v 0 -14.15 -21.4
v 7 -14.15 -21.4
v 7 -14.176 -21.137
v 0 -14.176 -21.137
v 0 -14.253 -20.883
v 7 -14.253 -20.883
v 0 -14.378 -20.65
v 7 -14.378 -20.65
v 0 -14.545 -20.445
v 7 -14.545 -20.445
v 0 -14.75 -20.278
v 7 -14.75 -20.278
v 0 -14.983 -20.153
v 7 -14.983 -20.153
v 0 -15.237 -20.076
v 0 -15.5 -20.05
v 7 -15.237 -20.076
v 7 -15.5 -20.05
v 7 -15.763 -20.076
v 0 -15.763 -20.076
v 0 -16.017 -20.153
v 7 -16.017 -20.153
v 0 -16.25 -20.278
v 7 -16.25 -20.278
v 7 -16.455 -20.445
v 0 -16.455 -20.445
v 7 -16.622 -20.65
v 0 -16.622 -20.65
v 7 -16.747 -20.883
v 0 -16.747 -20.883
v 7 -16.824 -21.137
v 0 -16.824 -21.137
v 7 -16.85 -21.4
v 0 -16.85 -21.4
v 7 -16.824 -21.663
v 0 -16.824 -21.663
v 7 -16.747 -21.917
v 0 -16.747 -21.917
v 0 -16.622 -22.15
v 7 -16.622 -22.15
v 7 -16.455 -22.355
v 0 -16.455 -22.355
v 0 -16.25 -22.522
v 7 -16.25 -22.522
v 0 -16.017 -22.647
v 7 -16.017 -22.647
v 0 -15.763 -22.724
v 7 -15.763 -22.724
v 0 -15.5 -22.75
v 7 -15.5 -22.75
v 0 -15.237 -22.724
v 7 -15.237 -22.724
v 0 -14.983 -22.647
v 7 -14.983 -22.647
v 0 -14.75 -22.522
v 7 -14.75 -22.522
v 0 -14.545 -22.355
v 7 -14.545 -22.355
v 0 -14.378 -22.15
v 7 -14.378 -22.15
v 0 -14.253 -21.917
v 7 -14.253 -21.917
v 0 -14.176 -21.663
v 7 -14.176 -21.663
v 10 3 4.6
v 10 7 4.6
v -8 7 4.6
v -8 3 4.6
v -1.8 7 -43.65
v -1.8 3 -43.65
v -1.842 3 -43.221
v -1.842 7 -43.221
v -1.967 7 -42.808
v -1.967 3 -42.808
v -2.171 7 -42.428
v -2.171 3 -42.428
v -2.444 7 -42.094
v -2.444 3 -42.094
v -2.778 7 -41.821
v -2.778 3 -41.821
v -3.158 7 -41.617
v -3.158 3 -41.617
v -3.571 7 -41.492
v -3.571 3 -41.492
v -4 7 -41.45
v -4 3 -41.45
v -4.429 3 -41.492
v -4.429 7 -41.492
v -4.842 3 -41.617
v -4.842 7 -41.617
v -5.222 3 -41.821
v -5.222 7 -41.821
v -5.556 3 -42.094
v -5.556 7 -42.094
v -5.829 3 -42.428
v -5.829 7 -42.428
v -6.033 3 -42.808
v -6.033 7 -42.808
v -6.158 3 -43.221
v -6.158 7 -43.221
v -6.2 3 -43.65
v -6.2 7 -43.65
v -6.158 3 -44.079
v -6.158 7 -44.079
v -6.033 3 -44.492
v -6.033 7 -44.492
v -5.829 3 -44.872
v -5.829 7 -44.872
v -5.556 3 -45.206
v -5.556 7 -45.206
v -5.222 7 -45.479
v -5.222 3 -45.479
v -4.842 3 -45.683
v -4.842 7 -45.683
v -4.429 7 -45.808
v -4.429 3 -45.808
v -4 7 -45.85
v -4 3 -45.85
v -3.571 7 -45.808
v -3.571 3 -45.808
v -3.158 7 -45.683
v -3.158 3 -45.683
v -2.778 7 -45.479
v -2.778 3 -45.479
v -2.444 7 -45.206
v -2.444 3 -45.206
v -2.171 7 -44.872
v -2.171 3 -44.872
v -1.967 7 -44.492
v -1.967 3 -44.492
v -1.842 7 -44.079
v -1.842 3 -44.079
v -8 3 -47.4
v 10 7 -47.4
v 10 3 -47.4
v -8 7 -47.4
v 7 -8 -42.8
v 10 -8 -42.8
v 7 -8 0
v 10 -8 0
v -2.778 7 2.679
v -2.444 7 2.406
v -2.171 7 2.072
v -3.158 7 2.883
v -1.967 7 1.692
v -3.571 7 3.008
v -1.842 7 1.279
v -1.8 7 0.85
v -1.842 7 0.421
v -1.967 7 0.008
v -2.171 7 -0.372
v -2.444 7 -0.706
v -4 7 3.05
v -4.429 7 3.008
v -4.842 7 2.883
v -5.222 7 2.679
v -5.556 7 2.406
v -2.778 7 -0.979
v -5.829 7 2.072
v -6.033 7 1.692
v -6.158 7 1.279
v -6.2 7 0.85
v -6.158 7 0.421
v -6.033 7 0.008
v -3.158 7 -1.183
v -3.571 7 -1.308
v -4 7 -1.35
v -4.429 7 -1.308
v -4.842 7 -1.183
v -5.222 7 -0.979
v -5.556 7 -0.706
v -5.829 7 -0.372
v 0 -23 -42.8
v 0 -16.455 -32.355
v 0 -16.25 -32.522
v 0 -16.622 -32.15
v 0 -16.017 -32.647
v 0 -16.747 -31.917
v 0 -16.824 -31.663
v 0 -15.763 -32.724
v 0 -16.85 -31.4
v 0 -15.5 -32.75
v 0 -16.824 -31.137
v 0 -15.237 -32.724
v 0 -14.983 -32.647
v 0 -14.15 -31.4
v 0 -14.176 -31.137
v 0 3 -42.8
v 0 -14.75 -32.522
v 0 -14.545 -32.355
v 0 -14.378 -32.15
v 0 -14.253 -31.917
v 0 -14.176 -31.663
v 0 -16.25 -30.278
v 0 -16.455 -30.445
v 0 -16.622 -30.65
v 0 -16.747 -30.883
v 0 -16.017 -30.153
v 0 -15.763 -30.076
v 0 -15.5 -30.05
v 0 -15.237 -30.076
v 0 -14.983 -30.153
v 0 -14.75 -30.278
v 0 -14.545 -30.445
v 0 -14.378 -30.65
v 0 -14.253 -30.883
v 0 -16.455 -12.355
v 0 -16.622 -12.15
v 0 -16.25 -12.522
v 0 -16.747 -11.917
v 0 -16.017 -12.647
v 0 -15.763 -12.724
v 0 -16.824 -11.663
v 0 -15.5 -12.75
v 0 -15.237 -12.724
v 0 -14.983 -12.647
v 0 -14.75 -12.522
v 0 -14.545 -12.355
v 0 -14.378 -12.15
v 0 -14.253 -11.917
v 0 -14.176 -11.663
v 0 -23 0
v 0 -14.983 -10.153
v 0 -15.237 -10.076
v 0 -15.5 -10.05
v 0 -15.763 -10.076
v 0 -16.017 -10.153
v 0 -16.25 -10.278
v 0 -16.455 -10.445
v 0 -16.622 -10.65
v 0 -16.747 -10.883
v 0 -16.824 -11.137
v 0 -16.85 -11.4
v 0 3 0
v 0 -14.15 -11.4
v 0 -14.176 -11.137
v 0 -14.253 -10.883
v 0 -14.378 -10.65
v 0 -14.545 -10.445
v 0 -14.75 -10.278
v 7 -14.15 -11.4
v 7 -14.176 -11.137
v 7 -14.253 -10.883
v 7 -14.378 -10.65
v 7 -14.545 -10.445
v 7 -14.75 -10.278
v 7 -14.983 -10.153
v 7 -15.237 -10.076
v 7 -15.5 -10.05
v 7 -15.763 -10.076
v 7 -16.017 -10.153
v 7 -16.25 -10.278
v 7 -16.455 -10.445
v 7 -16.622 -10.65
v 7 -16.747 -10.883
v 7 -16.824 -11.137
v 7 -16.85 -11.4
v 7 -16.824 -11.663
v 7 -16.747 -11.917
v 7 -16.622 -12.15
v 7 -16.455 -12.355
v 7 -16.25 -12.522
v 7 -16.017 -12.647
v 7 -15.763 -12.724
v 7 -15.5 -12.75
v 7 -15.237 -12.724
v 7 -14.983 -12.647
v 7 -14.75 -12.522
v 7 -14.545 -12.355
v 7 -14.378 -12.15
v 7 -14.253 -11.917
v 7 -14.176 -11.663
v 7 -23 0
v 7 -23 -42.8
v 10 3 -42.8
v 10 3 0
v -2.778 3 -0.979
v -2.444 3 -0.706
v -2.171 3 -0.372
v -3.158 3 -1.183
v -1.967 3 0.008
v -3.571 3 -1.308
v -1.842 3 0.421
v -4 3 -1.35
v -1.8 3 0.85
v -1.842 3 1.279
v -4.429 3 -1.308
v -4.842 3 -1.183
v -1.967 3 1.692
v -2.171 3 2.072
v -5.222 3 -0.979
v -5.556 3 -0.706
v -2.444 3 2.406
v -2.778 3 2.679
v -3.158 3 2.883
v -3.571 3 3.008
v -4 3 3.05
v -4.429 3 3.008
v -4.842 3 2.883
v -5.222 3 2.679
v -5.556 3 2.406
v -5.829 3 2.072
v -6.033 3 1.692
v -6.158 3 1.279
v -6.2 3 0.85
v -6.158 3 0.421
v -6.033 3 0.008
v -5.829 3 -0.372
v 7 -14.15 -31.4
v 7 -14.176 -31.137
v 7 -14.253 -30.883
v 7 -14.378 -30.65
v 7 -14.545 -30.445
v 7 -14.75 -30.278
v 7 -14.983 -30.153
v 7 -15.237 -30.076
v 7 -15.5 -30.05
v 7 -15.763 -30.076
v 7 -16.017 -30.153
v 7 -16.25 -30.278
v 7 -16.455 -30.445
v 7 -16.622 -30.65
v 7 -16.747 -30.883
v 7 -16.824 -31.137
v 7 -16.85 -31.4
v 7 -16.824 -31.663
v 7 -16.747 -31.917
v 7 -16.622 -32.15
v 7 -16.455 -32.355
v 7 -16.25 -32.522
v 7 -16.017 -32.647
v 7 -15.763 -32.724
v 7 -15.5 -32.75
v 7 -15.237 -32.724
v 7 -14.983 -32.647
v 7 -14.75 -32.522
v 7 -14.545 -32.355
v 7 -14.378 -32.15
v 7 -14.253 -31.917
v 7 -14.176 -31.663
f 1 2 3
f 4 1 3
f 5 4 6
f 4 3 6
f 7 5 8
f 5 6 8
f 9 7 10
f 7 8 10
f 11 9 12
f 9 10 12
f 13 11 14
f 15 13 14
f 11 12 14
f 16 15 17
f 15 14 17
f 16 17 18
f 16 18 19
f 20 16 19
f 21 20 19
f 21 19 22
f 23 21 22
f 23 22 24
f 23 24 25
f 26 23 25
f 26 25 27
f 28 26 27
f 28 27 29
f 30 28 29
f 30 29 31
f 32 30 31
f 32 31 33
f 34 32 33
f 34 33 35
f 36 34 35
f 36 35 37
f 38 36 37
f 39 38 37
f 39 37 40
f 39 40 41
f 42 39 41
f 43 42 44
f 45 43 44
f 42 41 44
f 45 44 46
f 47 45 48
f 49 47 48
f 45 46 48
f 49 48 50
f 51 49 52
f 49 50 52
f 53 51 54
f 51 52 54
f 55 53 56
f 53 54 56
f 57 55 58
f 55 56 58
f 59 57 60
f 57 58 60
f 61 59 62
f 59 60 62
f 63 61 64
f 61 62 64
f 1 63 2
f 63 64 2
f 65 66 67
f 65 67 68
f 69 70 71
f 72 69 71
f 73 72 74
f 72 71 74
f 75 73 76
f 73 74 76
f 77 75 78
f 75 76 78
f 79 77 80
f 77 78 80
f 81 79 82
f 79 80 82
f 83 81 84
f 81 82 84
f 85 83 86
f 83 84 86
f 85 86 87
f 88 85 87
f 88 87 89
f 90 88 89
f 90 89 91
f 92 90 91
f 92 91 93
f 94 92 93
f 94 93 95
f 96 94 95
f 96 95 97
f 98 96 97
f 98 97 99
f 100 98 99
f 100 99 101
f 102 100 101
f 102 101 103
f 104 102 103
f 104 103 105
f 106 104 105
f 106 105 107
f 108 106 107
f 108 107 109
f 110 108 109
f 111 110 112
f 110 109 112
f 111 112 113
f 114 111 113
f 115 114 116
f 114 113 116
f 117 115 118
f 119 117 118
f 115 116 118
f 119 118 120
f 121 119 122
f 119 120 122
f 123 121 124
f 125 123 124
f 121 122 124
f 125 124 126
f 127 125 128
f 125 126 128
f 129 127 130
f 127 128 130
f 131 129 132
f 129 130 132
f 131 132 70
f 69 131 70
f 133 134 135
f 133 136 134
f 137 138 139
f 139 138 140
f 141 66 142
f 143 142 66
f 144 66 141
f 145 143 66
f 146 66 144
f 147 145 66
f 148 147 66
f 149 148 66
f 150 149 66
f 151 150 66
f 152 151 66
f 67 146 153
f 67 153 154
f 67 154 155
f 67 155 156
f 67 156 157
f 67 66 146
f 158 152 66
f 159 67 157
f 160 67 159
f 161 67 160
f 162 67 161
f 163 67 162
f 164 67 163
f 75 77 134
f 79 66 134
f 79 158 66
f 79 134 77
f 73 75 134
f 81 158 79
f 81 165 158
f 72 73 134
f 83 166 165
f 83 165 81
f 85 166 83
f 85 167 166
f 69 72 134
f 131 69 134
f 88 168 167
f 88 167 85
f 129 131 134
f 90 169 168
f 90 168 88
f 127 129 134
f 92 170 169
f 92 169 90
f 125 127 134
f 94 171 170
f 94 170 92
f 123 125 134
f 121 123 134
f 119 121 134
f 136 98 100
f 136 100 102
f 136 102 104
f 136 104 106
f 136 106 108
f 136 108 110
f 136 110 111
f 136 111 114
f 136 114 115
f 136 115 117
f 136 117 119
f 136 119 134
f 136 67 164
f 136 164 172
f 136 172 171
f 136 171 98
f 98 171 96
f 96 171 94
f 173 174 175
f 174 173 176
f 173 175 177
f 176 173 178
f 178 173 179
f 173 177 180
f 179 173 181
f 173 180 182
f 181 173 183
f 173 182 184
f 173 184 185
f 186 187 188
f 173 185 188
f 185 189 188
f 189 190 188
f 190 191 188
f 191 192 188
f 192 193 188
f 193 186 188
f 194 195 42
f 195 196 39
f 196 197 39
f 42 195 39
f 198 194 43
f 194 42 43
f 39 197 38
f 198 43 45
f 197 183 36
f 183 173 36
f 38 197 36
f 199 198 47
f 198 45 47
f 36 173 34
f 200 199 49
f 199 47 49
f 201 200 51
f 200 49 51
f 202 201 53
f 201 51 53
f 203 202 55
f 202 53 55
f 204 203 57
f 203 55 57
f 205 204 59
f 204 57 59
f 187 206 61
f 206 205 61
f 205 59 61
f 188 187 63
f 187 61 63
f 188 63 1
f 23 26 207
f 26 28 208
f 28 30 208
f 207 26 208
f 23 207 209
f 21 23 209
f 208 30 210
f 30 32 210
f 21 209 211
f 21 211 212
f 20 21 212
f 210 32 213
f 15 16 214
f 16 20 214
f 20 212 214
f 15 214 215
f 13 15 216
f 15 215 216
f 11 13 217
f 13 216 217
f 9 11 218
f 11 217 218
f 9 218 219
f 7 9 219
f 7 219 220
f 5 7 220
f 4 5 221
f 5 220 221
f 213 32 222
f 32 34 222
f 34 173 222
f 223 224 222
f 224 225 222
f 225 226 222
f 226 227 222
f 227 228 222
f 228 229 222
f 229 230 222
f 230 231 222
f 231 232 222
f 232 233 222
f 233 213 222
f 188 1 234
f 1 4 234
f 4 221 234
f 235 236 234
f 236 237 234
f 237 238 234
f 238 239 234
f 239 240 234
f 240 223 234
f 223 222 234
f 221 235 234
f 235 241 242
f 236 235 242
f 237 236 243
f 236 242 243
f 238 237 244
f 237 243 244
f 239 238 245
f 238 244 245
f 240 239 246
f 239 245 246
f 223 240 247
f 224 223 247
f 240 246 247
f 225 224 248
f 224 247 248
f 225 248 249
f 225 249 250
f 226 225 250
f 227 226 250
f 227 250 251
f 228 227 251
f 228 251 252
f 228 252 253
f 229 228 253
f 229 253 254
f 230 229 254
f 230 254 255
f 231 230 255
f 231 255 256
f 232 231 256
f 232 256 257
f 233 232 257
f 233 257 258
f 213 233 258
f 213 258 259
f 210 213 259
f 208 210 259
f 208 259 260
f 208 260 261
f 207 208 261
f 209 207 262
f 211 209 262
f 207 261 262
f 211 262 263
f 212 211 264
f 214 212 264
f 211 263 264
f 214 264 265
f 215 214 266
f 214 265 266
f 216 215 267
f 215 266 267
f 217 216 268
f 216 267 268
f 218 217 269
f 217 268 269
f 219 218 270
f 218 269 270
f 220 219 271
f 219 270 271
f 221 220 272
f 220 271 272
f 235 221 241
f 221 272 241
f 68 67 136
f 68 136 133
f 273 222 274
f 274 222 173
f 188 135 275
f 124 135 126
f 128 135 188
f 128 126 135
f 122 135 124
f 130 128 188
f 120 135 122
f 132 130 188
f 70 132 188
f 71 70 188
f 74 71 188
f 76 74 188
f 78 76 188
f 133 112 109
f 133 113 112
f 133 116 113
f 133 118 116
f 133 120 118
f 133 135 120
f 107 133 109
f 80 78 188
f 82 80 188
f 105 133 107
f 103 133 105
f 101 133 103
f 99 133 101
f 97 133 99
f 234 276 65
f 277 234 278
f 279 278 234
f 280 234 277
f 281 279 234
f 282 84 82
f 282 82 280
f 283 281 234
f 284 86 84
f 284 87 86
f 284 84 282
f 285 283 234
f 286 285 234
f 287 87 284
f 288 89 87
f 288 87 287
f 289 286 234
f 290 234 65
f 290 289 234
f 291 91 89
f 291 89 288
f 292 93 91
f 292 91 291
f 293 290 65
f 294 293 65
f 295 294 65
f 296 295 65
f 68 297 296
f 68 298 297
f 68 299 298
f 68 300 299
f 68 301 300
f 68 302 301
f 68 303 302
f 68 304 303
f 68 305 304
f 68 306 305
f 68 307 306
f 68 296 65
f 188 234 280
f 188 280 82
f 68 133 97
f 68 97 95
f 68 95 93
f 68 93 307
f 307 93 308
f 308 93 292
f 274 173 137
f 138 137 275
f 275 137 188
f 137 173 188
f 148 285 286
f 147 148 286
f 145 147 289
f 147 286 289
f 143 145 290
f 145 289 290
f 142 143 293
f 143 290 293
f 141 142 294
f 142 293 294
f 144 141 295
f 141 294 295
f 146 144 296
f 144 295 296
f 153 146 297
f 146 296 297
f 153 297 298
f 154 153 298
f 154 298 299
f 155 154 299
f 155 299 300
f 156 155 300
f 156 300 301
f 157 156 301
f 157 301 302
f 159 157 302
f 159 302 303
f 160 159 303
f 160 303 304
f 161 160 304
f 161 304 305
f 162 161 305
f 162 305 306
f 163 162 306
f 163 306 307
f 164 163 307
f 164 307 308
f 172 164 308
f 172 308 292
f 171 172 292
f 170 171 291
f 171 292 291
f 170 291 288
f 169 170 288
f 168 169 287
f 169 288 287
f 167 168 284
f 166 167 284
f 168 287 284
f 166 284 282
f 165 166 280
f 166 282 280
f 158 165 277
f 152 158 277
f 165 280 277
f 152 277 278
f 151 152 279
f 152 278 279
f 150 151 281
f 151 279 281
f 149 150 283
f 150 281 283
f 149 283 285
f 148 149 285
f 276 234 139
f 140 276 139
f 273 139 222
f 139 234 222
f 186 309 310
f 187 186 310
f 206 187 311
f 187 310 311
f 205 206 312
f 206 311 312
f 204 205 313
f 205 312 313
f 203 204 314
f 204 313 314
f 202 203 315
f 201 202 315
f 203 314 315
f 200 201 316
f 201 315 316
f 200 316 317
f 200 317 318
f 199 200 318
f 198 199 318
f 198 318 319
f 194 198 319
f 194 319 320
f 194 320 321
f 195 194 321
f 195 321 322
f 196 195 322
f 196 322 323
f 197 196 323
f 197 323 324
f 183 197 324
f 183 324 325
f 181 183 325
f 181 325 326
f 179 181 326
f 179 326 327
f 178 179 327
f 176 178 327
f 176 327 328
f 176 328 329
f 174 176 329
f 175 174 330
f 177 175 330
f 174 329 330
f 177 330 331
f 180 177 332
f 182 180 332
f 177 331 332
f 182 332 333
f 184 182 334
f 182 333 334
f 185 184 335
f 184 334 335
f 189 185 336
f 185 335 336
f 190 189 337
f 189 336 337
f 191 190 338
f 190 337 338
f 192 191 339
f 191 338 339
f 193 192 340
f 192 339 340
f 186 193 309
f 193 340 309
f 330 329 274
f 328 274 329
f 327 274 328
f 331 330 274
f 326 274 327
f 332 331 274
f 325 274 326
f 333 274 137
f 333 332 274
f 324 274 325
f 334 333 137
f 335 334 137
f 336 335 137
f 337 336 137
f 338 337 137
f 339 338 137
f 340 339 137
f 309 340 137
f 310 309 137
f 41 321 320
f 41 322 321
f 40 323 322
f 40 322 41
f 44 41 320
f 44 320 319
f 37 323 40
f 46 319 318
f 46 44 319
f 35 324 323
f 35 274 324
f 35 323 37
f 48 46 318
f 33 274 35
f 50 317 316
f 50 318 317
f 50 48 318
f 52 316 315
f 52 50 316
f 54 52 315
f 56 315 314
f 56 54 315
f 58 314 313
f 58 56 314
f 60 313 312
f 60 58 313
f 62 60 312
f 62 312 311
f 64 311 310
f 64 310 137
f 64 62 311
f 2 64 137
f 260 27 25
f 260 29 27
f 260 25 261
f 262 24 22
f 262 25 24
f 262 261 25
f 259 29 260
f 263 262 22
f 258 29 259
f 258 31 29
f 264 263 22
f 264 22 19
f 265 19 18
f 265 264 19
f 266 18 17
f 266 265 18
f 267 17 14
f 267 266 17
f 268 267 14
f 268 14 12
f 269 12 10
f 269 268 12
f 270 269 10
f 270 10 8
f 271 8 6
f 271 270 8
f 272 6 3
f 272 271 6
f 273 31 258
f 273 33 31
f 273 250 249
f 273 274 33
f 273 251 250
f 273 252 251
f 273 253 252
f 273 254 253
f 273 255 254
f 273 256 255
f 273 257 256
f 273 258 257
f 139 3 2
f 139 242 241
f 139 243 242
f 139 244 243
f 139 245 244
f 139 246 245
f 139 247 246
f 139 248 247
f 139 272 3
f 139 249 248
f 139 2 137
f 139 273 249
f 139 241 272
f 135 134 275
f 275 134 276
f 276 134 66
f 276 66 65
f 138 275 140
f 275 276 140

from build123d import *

# Parameters (mm, degrees)
F1_DEPTH  = 10
F2_W      = 15
F2_H      = 42.8
F3_DEPTH  = 3
F4_R      = 1.35
F5_DEPTH  = 7.001
F6_W      = 4
F6_H      = 4.6
F6_H_2    = 42.8
F7_DEPTH  = 8
F8_DEPTH  = 10
F9_R      = 2.2
F10_DEPTH = 4.001


with BuildPart() as f1:
    # F0 (on Right) → F1 (new body)
    with BuildSketch(Plane.YZ):
        Polygon((7, 0), (-23, 0), (-23, -42.8), (0, -42.8), (7, -42.8), align=None)
    extrude(amount=F1_DEPTH)

    # F2 (on face) → F3 (cut)
    with BuildSketch(Plane.YZ.offset(10)):
        with Locations((-15.5, -21.4)):
            Rectangle(F2_W, F2_H)
    extrude(amount=-F3_DEPTH, mode=Mode.SUBTRACT)

    # F4 (on face) → F5 (cut, through all)
    with BuildSketch(Plane.YZ.offset(7)):
        with Locations((-15.5, -21.4)):
            Circle(F4_R)
        with Locations((-15.5, -11.4)):
            Circle(F4_R)
        with Locations((-15.5, -31.4)):
            Circle(F4_R)
    extrude(amount=-F5_DEPTH, mode=Mode.SUBTRACT)

    # F6 (on face) → F7 (join)
    with BuildSketch(Plane(origin=(0, 0, 0), x_dir=(0, -1, 0), z_dir=(-1, 0, 0))):
        with Locations((-5, 2.3)):
            Rectangle(F6_W, F6_H)
        with Locations((-5, -45.1)):
            Rectangle(F6_W, F6_H)
        with Locations((-5, -21.4)):
            Rectangle(F6_W, F6_H_2)
    extrude(amount=F7_DEPTH)

    # F8 (add): faces of the model
    f8_faces = [f1.faces().sort_by_distance(p)[0] for p in [
        (0, 5, -45.1),
        (0, 5, 2.3),
    ]]
    extrude(f8_faces, amount=F8_DEPTH)

    # F9 (on face) → F10 (cut, through all)
    with BuildSketch(Plane.XZ.offset(-3)):
        with Locations((-4, 0.85)):
            Circle(F9_R)
        with Locations((-4, -43.65)):
            Circle(F9_R)
    extrude(amount=-F10_DEPTH, mode=Mode.SUBTRACT)


solid = f1.part
